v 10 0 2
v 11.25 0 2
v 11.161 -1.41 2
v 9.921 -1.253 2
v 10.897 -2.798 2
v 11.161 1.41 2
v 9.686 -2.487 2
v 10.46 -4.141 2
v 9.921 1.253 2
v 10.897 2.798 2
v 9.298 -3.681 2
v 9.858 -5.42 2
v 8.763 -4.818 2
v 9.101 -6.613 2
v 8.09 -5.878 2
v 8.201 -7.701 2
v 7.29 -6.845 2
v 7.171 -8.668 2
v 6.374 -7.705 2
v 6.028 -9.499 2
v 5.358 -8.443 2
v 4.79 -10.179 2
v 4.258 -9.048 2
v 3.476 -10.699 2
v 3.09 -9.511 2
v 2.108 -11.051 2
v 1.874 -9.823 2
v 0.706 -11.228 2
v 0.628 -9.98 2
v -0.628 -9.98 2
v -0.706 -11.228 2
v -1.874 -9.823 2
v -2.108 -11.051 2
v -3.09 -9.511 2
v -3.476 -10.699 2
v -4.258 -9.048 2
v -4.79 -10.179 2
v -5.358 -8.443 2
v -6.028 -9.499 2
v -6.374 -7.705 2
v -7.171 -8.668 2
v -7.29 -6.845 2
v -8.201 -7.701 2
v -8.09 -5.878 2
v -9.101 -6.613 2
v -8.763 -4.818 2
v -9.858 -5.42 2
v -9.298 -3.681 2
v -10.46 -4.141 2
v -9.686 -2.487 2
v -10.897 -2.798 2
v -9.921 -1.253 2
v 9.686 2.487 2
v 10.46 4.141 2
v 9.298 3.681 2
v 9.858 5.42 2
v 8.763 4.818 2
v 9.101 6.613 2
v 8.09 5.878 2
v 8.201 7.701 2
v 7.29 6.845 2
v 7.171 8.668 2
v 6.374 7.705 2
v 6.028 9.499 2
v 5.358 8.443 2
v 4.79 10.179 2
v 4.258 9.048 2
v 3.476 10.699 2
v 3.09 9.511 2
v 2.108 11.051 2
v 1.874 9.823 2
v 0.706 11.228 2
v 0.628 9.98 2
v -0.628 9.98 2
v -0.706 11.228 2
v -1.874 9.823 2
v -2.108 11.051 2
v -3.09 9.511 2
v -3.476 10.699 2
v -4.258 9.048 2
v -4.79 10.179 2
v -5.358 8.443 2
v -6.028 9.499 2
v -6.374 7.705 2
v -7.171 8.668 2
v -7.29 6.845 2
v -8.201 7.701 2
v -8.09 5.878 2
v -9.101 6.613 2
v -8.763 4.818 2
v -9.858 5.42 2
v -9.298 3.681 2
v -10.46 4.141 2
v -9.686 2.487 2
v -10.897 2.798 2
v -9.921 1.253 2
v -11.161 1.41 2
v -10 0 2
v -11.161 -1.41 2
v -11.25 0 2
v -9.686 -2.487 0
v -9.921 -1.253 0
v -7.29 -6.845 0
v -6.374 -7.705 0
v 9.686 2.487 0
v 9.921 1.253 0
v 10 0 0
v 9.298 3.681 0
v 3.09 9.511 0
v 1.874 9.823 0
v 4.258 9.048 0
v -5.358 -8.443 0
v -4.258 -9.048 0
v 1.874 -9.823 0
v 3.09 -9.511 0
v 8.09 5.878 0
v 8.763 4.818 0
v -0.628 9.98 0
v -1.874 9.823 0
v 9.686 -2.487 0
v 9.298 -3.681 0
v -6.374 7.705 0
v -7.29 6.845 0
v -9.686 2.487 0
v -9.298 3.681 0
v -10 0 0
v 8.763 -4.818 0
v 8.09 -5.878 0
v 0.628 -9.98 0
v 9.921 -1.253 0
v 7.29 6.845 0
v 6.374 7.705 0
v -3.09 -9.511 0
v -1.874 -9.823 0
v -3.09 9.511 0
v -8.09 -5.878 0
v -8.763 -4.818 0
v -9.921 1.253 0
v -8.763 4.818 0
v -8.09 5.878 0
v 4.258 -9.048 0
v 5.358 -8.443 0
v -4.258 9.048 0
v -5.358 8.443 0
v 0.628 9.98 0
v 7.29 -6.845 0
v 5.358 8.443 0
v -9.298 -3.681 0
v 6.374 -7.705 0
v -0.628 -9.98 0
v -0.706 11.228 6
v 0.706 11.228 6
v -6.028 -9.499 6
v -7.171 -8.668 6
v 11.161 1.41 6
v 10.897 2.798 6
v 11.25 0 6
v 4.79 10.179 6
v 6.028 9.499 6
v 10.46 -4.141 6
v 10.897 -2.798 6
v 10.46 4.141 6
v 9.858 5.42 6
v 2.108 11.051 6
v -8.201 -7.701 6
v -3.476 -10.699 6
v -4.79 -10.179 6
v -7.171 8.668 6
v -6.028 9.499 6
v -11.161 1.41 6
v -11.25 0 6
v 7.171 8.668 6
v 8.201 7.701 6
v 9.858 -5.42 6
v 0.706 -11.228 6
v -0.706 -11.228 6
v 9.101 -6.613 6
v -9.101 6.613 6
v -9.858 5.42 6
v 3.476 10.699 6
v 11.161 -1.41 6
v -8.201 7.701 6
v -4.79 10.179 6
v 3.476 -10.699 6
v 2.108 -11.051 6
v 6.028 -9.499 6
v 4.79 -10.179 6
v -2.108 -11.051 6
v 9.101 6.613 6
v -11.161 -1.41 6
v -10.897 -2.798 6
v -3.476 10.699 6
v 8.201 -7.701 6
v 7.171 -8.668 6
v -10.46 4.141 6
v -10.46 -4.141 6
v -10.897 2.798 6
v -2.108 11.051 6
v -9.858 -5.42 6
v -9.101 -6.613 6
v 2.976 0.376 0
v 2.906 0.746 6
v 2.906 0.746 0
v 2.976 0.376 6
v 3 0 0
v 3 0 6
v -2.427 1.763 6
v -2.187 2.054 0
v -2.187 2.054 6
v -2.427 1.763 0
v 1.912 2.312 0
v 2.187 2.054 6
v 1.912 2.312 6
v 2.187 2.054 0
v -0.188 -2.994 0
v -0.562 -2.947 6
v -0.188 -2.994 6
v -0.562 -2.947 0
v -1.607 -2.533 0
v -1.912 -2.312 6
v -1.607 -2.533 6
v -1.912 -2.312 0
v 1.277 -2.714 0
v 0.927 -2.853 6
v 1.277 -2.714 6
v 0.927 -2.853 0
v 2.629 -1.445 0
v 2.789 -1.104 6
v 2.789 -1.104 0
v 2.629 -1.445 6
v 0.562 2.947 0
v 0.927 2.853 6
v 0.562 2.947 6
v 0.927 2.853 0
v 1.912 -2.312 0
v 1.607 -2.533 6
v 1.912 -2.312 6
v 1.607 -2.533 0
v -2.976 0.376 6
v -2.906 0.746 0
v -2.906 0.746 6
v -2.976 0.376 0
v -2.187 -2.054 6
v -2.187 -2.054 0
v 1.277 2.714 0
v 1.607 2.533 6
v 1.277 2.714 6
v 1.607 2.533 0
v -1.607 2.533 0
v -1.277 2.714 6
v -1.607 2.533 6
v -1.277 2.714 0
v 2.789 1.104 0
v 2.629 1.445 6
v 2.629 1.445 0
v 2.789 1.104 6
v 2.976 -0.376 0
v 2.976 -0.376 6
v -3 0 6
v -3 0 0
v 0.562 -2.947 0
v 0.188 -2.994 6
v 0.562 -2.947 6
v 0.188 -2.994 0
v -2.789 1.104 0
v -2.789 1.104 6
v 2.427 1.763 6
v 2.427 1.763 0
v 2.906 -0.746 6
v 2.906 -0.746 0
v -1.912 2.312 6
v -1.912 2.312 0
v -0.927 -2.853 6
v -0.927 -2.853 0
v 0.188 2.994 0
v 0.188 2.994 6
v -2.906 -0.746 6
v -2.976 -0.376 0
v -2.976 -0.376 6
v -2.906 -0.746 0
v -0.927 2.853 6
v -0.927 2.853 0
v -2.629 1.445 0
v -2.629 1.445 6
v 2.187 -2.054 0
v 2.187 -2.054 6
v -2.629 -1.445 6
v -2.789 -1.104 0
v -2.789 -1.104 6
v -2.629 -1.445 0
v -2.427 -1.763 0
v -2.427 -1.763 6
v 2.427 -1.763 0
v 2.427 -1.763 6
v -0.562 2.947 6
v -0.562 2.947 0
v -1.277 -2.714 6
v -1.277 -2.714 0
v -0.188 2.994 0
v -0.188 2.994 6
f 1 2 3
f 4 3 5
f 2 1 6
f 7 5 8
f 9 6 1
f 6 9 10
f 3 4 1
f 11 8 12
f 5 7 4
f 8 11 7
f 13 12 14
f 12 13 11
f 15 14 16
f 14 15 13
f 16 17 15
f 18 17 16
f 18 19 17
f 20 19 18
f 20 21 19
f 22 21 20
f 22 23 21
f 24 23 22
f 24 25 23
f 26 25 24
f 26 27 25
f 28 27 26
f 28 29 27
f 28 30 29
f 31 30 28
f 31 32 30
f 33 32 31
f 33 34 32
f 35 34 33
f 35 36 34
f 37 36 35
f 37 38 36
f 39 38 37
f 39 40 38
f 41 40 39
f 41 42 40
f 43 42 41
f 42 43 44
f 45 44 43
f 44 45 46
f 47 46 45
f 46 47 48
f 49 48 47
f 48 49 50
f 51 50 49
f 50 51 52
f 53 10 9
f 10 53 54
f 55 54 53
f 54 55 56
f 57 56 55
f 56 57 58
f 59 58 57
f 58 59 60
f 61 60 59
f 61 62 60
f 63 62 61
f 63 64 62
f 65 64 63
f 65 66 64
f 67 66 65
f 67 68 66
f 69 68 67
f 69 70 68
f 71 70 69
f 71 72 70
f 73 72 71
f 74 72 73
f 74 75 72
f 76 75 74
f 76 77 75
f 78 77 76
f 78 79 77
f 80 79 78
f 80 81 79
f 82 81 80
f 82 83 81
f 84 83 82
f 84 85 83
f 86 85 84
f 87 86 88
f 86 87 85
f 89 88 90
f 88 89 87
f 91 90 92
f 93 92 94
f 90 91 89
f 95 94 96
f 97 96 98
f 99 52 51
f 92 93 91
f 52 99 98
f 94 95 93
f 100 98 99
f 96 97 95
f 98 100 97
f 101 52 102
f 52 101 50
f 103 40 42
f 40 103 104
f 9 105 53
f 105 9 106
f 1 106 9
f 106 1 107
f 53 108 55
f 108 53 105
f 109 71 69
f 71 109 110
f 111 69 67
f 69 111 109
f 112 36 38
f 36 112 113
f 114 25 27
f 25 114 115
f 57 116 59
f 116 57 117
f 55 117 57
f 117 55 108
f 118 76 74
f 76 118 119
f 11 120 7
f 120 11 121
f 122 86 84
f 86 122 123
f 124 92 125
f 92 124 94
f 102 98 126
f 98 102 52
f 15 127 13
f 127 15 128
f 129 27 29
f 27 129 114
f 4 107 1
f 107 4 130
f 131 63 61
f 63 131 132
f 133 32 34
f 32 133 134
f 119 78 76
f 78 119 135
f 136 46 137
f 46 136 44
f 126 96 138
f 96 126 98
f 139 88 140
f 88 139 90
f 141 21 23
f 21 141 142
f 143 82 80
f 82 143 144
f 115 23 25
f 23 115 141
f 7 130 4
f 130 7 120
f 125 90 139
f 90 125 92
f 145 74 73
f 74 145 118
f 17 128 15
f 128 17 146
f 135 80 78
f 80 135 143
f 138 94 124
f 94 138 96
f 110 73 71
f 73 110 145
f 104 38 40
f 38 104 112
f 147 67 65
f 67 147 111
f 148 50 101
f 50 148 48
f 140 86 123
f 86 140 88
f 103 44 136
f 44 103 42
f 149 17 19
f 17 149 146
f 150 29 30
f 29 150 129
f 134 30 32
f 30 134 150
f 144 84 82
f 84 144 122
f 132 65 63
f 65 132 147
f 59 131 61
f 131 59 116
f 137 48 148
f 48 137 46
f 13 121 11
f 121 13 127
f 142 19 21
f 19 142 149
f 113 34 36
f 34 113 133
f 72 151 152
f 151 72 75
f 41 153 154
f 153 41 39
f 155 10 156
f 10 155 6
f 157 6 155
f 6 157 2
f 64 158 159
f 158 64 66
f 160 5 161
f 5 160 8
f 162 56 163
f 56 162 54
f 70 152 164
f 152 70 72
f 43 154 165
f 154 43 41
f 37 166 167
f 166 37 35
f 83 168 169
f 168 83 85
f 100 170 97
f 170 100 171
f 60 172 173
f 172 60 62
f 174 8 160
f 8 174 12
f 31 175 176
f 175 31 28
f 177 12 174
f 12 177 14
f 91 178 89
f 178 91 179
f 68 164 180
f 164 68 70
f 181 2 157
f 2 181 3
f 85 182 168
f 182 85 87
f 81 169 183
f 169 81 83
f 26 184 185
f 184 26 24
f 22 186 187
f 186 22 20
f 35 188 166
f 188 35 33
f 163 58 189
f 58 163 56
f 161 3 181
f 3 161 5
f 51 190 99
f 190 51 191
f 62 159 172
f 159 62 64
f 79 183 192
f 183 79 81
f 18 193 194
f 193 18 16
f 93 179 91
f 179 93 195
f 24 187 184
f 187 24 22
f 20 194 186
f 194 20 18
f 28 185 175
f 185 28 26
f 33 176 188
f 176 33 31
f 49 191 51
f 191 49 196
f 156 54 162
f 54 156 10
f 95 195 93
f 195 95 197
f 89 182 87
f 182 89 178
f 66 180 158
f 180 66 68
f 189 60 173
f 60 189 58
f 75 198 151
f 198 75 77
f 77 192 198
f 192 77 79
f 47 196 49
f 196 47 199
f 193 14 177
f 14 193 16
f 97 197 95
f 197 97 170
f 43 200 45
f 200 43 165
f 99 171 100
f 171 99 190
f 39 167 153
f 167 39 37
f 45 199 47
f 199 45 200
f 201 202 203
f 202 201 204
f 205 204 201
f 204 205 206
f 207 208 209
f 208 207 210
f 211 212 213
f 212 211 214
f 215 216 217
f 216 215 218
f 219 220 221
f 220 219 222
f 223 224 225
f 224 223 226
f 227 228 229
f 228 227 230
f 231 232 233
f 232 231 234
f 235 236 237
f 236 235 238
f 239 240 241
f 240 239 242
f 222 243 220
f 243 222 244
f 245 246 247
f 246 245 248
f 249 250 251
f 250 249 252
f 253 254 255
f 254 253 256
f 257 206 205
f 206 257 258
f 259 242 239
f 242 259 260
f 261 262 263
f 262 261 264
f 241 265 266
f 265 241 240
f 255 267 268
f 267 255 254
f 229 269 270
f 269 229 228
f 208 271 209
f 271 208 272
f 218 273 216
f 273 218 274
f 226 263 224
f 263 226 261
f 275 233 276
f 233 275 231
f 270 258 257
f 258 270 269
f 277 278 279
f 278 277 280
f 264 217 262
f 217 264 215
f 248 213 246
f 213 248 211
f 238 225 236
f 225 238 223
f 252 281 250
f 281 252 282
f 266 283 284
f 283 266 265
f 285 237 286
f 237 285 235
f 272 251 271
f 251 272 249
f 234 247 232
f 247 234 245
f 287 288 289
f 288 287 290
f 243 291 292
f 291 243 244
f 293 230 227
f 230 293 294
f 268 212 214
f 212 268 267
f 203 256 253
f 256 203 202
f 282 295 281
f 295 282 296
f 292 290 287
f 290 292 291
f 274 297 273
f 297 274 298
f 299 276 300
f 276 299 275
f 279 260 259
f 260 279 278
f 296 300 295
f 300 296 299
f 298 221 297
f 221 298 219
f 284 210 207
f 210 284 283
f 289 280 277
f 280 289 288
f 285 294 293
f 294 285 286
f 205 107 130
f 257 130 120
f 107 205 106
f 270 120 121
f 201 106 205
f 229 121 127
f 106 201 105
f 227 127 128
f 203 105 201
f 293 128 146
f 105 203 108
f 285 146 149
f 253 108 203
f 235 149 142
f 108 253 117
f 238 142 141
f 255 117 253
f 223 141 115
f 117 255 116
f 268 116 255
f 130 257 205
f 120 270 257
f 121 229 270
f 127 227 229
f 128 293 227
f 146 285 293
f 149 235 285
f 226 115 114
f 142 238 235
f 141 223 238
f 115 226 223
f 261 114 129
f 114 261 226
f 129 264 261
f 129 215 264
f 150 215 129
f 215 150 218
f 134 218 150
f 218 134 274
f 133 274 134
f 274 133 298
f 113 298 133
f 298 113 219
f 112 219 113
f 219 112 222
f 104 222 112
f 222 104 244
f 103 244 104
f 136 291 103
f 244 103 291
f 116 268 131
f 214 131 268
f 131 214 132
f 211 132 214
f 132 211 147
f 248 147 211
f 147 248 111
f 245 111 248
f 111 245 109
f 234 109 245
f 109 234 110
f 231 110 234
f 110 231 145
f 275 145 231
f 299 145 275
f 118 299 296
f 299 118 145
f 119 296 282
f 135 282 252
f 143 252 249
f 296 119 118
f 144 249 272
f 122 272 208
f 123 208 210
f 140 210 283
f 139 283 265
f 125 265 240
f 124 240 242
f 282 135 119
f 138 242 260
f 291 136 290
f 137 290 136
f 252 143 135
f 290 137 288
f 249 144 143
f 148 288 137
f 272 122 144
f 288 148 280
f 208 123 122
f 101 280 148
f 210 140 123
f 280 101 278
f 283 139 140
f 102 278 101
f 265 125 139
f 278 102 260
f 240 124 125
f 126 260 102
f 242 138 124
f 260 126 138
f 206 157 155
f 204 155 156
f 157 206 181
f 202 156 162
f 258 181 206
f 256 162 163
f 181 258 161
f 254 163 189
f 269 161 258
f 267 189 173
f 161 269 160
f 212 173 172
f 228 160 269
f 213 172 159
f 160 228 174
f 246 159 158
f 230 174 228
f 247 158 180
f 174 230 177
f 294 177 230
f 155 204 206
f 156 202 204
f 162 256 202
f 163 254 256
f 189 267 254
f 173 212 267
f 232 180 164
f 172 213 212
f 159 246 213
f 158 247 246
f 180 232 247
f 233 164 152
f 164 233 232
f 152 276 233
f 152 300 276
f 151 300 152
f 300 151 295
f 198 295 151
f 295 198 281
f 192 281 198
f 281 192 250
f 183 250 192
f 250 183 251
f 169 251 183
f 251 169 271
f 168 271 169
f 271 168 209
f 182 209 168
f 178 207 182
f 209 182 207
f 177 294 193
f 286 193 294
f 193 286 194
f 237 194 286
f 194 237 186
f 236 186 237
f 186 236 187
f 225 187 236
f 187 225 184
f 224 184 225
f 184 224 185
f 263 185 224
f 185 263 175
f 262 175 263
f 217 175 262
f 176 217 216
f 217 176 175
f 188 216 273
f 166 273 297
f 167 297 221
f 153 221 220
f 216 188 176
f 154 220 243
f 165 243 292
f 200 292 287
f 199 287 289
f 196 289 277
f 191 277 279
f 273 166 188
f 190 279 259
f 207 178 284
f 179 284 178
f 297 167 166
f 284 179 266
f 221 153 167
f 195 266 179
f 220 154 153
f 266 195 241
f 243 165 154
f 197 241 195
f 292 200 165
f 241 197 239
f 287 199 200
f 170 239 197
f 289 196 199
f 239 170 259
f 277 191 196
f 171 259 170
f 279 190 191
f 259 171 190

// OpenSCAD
$fn = 50;


difference() {
	union() {
		*color(alpha = 1.0000000000, c = "gray") {
			translate(v = [0, 7, 0]) {
				linear_extrude(height = 12) {
					text(font = "Arial:style=Bold", halign = "center", size = 4.5000000000, text = "COMMENT bearing_plate_plate", valign = "center");
				}
			}
		}
		*color(alpha = 1.0000000000, c = "gray") {
			translate(v = [0, 14, 0]) {
				linear_extrude(height = 12) {
					text(font = "Arial:style=Bold", halign = "center", size = 4.5000000000, text = "COMMENT description oobb_cylinder_shape_p_type_12_depth_3_width_12_height_12_thickness_motor_building_block_large_01_shaft_p_t_12.0_radius_all_mode", valign = "center");
				}
			}
		}
		translate(v = [0, 0, -6.0000000000]) {
			cylinder(h = 12, r = 12.0000000000);
		}
		*color(alpha = 1.0000000000, c = "gray") {
			translate(v = [0, 7, 0]) {
				linear_extrude(height = 1) {
					text(font = "Arial:style=Bold", halign = "center", size = 4.5000000000, text = "COMMENT bearing_plate_slice", valign = "center");
				}
			}
		}
	}
	union() {
		translate(v = [14.2500000000, 4.7500000000, -10.0000000000]) {
			rotate(a = [0, 0, 0]) {
				difference() {
					union() {
						cylinder(h = 3, r = 2.9000000000);
						translate(v = [0, 0, -25.0000000000]) {
							cylinder(h = 25, r = 1.5000000000);
						}
						translate(v = [0, 0, -25.0000000000]) {
							cylinder(h = 25, r = 1.8000000000);
						}
						translate(v = [0, 0, -25.0000000000]) {
							cylinder(h = 25, r = 1.5000000000);
						}
					}
					union();
				}
			}
		}
		translate(v = [14.2500000000, -4.7500000000, -10.0000000000]) {
			rotate(a = [0, 0, 0]) {
				difference() {
					union() {
						cylinder(h = 3, r = 2.9000000000);
						translate(v = [0, 0, -25.0000000000]) {
							cylinder(h = 25, r = 1.5000000000);
						}
						translate(v = [0, 0, -25.0000000000]) {
							cylinder(h = 25, r = 1.8000000000);
						}
						translate(v = [0, 0, -25.0000000000]) {
							cylinder(h = 25, r = 1.5000000000);
						}
					}
					union();
				}
			}
		}
		translate(v = [-36.2500000000, 4.7500000000, -10.0000000000]) {
			rotate(a = [0, 0, 0]) {
				difference() {
					union() {
						cylinder(h = 3, r = 2.9000000000);
						translate(v = [0, 0, -25.0000000000]) {
							cylinder(h = 25, r = 1.5000000000);
						}
						translate(v = [0, 0, -25.0000000000]) {
							cylinder(h = 25, r = 1.8000000000);
						}
						translate(v = [0, 0, -25.0000000000]) {
							cylinder(h = 25, r = 1.5000000000);
						}
					}
					union();
				}
			}
		}
		translate(v = [-36.2500000000, -4.7500000000, -10.0000000000]) {
			rotate(a = [0, 0, 0]) {
				difference() {
					union() {
						cylinder(h = 3, r = 2.9000000000);
						translate(v = [0, 0, -25.0000000000]) {
							cylinder(h = 25, r = 1.5000000000);
						}
						translate(v = [0, 0, -25.0000000000]) {
							cylinder(h = 25, r = 1.8000000000);
						}
						translate(v = [0, 0, -25.0000000000]) {
							cylinder(h = 25, r = 1.5000000000);
						}
					}
					union();
				}
			}
		}
		translate(v = [18.0000000000, 0, -6.0000000000]) {
			rotate(a = [0, 180, 30.0000000000]) {
				difference() {
					union() {
						translate(v = [0, 0, -0.8500000000]) {
							cylinder(r1 = 1.5000000000, r2 = 2.4000000000);
						}
						translate(v = [0, 0, -12.0000000000]) {
							cylinder(h = 12, r = 1.5000000000);
						}
						translate(v = [0, 0, -12.0000000000]) {
							linear_extrude(height = 2.5000000000) {
								polygon(points = [[3.1735000000, 0.0000000000], [1.5867500000, 2.7483316189], [-1.5867500000, 2.7483316189], [-3.1735000000, 0.0000000000], [-1.5867500000, -2.7483316189], [1.5867500000, -2.7483316189]]);
							}
						}
						translate(v = [0, 0, -12.0000000000]) {
							cylinder(h = 12, r = 1.8000000000);
						}
						translate(v = [0, 0, -12.0000000000]) {
							linear_extrude(height = 2.5000000000) {
								polygon(points = [[3.1735000000, 0.0000000000], [1.5867500000, 2.7483316189], [-1.5867500000, 2.7483316189], [-3.1735000000, 0.0000000000], [-1.5867500000, -2.7483316189], [1.5867500000, -2.7483316189]]);
							}
						}
						translate(v = [0, 0, -12.0000000000]) {
							cylinder(h = 12, r = 1.5000000000);
						}
						translate(v = [0, 0, -12.0000000000]) {
							linear_extrude(height = 2.5000000000) {
								polygon(points = [[3.1735000000, 0.0000000000], [1.5867500000, 2.7483316189], [-1.5867500000, 2.7483316189], [-3.1735000000, 0.0000000000], [-1.5867500000, -2.7483316189], [1.5867500000, -2.7483316189]]);
							}
						}
					}
					union();
				}
			}
		}
		translate(v = [-18.0000000000, 0, -6.0000000000]) {
			rotate(a = [0, 180, 30.0000000000]) {
				difference() {
					union() {
						translate(v = [0, 0, -0.8500000000]) {
							cylinder(r1 = 1.5000000000, r2 = 2.4000000000);
						}
						translate(v = [0, 0, -12.0000000000]) {
							cylinder(h = 12, r = 1.5000000000);
						}
						translate(v = [0, 0, -12.0000000000]) {
							linear_extrude(height = 2.5000000000) {
								polygon(points = [[3.1735000000, 0.0000000000], [1.5867500000, 2.7483316189], [-1.5867500000, 2.7483316189], [-3.1735000000, 0.0000000000], [-1.5867500000, -2.7483316189], [1.5867500000, -2.7483316189]]);
							}
						}
						translate(v = [0, 0, -12.0000000000]) {
							cylinder(h = 12, r = 1.8000000000);
						}
						translate(v = [0, 0, -12.0000000000]) {
							linear_extrude(height = 2.5000000000) {
								polygon(points = [[3.1735000000, 0.0000000000], [1.5867500000, 2.7483316189], [-1.5867500000, 2.7483316189], [-3.1735000000, 0.0000000000], [-1.5867500000, -2.7483316189], [1.5867500000, -2.7483316189]]);
							}
						}
						translate(v = [0, 0, -12.0000000000]) {
							cylinder(h = 12, r = 1.5000000000);
						}
						translate(v = [0, 0, -12.0000000000]) {
							linear_extrude(height = 2.5000000000) {
								polygon(points = [[3.1735000000, 0.0000000000], [1.5867500000, 2.7483316189], [-1.5867500000, 2.7483316189], [-3.1735000000, 0.0000000000], [-1.5867500000, -2.7483316189], [1.5867500000, -2.7483316189]]);
							}
						}
					}
					union();
				}
			}
		}
		translate(v = [0, 18.0000000000, 6.0000000000]) {
			rotate(a = [0, 0, 0]) {
				difference() {
					union() {
						translate(v = [0, 0, -0.8500000000]) {
							cylinder(r1 = 1.5000000000, r2 = 2.4000000000);
						}
						translate(v = [0, 0, -12.0000000000]) {
							cylinder(h = 12, r = 1.5000000000);
						}
						translate(v = [0, 0, -12.0000000000]) {
							linear_extrude(height = 2.5000000000) {
								polygon(points = [[3.1735000000, 0.0000000000], [1.5867500000, 2.7483316189], [-1.5867500000, 2.7483316189], [-3.1735000000, 0.0000000000], [-1.5867500000, -2.7483316189], [1.5867500000, -2.7483316189]]);
							}
						}
						translate(v = [0, 0, -12.0000000000]) {
							cylinder(h = 12, r = 1.8000000000);
						}
						translate(v = [0, 0, -12.0000000000]) {
							linear_extrude(height = 2.5000000000) {
								polygon(points = [[3.1735000000, 0.0000000000], [1.5867500000, 2.7483316189], [-1.5867500000, 2.7483316189], [-3.1735000000, 0.0000000000], [-1.5867500000, -2.7483316189], [1.5867500000, -2.7483316189]]);
							}
						}
						translate(v = [0, 0, -12.0000000000]) {
							cylinder(h = 12, r = 1.5000000000);
						}
						translate(v = [0, 0, -12.0000000000]) {
							linear_extrude(height = 2.5000000000) {
								polygon(points = [[3.1735000000, 0.0000000000], [1.5867500000, 2.7483316189], [-1.5867500000, 2.7483316189], [-3.1735000000, 0.0000000000], [-1.5867500000, -2.7483316189], [1.5867500000, -2.7483316189]]);
							}
						}
					}
					union();
				}
			}
		}
		translate(v = [0, -18.0000000000, 6.0000000000]) {
			rotate(a = [0, 0, 0]) {
				difference() {
					union() {
						translate(v = [0, 0, -0.8500000000]) {
							cylinder(r1 = 1.5000000000, r2 = 2.4000000000);
						}
						translate(v = [0, 0, -12.0000000000]) {
							cylinder(h = 12, r = 1.5000000000);
						}
						translate(v = [0, 0, -12.0000000000]) {
							linear_extrude(height = 2.5000000000) {
								polygon(points = [[3.1735000000, 0.0000000000], [1.5867500000, 2.7483316189], [-1.5867500000, 2.7483316189], [-3.1735000000, 0.0000000000], [-1.5867500000, -2.7483316189], [1.5867500000, -2.7483316189]]);
							}
						}
						translate(v = [0, 0, -12.0000000000]) {
							cylinder(h = 12, r = 1.8000000000);
						}
						translate(v = [0, 0, -12.0000000000]) {
							linear_extrude(height = 2.5000000000) {
								polygon(points = [[3.1735000000, 0.0000000000], [1.5867500000, 2.7483316189], [-1.5867500000, 2.7483316189], [-3.1735000000, 0.0000000000], [-1.5867500000, -2.7483316189], [1.5867500000, -2.7483316189]]);
							}
						}
						translate(v = [0, 0, -12.0000000000]) {
							cylinder(h = 12, r = 1.5000000000);
						}
						translate(v = [0, 0, -12.0000000000]) {
							linear_extrude(height = 2.5000000000) {
								polygon(points = [[3.1735000000, 0.0000000000], [1.5867500000, 2.7483316189], [-1.5867500000, 2.7483316189], [-3.1735000000, 0.0000000000], [-1.5867500000, -2.7483316189], [1.5867500000, -2.7483316189]]);
							}
						}
					}
					union();
				}
			}
		}
		*color(alpha = 1.0000000000, c = "gray") {
			translate(v = [0, 14, 0]) {
				linear_extrude(height = 3) {
					text(font = "Arial:style=Bold", halign = "center", size = 4.5000000000, text = "COMMENT description oobb_bearing_shape_n_type_12_depth_3_width_3_height_12_thickness_motor_building_block_large_01_shaft_6704_bearing", valign = "center");
				}
			}
		}
		translate(v = [0, 0, -2.0000000000]) {
			union() {
				difference() {
					cylinder(h = 4, r = 13.5000000000);
					cylinder(h = 4, r = 10.0000000000);
				}
				difference() {
					translate(v = [0, 0, -50]) {
						cylinder(h = 100, r = 12.2500000000);
					}
					translate(v = [0, 0, -50]) {
						cylinder(h = 100, r = 11.2500000000);
					}
				}
			}
		}
		*color(alpha = 1.0000000000, c = "gray") {
			translate(v = [0, 14, 0]) {
				linear_extrude(height = 3) {
					text(font = "Arial:style=Bold", halign = "center", size = 4.5000000000, text = "COMMENT description oobb_holes_shape_n_type_m6_radius_name_3_width_3_height_12_thickness_motor_building_block_large_01_shaft_perimeter_miss_middle_holes", valign = "center");
				}
			}
		}
		translate(v = [-15.0000000000, -15.0000000000, -50.0000000000]) {
			cylinder(h = 100, r = 3.0000000000);
		}
		translate(v = [-15.0000000000, 15.0000000000, -50.0000000000]) {
			cylinder(h = 100, r = 3.0000000000);
		}
		translate(v = [15.0000000000, -15.0000000000, -50.0000000000]) {
			cylinder(h = 100, r = 3.0000000000);
		}
		translate(v = [15.0000000000, 15.0000000000, -50.0000000000]) {
			cylinder(h = 100, r = 3.0000000000);
		}
		*color(alpha = 1.0000000000, c = "gray") {
			translate(v = [0, 14, -6.0000000000]) {
				linear_extrude(height = 3) {
					text(font = "Arial:style=Bold", halign = "center", size = 4.5000000000, text = "COMMENT description oobb_motor_building_block_large_01_shape_n_type_0_0_-6.0_pos_3_width_3_height_12_thickness_motor_building_block_large_01_shaft", valign = "center");
				}
			}
		}
		translate(v = [0, 0, -56.0000000000]) {
			cylinder(h = 100, r = 3.0000000000);
		}
		translate(v = [14.2500000000, 4.7500000000, -56.0000000000]) {
			cylinder(h = 100, r = 1.5000000000);
		}
		translate(v = [14.2500000000, -4.7500000000, -56.0000000000]) {
			cylinder(h = 100, r = 1.5000000000);
		}
		translate(v = [-36.2500000000, 4.7500000000, -56.0000000000]) {
			cylinder(h = 100, r = 1.5000000000);
		}
		translate(v = [-36.2500000000, -4.7500000000, -56.0000000000]) {
			cylinder(h = 100, r = 1.5000000000);
		}
		translate(v = [-32.2500000000, -10.7500000000, -46.0000000000]) {
			cube(size = [42.5000000000, 21.5000000000, 40]);
		}
		translate(v = [-36.2500000000, -1.7500000000, -14.5000000000]) {
			cube(size = [50.5000000000, 3.5000000000, 3]);
		}
		translate(v = [-41.7500000000, -10.7500000000, -17.0000000000]) {
			cube(size = [61.5000000000, 21.5000000000, 2.5000000000]);
		}
		*color(alpha = 1.0000000000, c = "gray") {
			translate(v = [18.0000000000, 14, -6.0000000000]) {
				rotate(a = [0, 180, 30.0000000000]) {
					linear_extrude(height = 3) {
						text(font = "Arial:style=Bold", halign = "center", size = 4.5000000000, text = "COMMENT description oobb_screw_countersunk_shape_n_type_m3_radius_name_12_depth_18.0_0_-6.0_pos_3_width_3_height_12_thickness_motor_building_block_large_01_shaft_0_180_30.0_rot_true_nut_true_overhang", valign = "center");
					}
				}
			}
		}
		*color(alpha = 1.0000000000, c = "gray") {
			translate(v = [-18.0000000000, 14, -6.0000000000]) {
				rotate(a = [0, 180, 30.0000000000]) {
					linear_extrude(height = 3) {
						text(font = "Arial:style=Bold", halign = "center", size = 4.5000000000, text = "COMMENT description oobb_screw_countersunk_shape_n_type_m3_radius_name_12_depth_-18.0_0_-6.0_pos_3_width_3_height_12_thickness_motor_building_block_large_01_shaft_0_180_30.0_rot_true_nut_true_overhang", valign = "center");
					}
				}
			}
		}
		*color(alpha = 1.0000000000, c = "gray") {
			translate(v = [0, 32.0000000000, 6.0000000000]) {
				linear_extrude(height = 3) {
					text(font = "Arial:style=Bold", halign = "center", size = 4.5000000000, text = "COMMENT description oobb_screw_countersunk_shape_n_type_m3_radius_name_12_depth_0_18.0_6.0_pos_3_width_3_height_12_thickness_motor_building_block_large_01_shaft_0_0_0_rot_true_nut_true_overhang", valign = "center");
				}
			}
		}
		*color(alpha = 1.0000000000, c = "gray") {
			translate(v = [0, -4.0000000000, 6.0000000000]) {
				linear_extrude(height = 3) {
					text(font = "Arial:style=Bold", halign = "center", size = 4.5000000000, text = "COMMENT description oobb_screw_countersunk_shape_n_type_m3_radius_name_12_depth_0_-18.0_6.0_pos_3_width_3_height_12_thickness_motor_building_block_large_01_shaft_0_0_0_rot_true_nut_true_overhang", valign = "center");
				}
			}
		}
		*color(alpha = 1.0000000000, c = "gray") {
			translate(v = [0, 14, 0]) {
				linear_extrude(height = 1) {
					text(font = "Arial:style=Bold", halign = "center", size = 4.5000000000, text = "COMMENT description oobb_slice_shape_n_type_3dpr_mode_top_zz", valign = "center");
				}
			}
		}
		translate(v = [-250, -250, -500]) {
			cube(size = [500, 500, 500]);
		}
	}
}
